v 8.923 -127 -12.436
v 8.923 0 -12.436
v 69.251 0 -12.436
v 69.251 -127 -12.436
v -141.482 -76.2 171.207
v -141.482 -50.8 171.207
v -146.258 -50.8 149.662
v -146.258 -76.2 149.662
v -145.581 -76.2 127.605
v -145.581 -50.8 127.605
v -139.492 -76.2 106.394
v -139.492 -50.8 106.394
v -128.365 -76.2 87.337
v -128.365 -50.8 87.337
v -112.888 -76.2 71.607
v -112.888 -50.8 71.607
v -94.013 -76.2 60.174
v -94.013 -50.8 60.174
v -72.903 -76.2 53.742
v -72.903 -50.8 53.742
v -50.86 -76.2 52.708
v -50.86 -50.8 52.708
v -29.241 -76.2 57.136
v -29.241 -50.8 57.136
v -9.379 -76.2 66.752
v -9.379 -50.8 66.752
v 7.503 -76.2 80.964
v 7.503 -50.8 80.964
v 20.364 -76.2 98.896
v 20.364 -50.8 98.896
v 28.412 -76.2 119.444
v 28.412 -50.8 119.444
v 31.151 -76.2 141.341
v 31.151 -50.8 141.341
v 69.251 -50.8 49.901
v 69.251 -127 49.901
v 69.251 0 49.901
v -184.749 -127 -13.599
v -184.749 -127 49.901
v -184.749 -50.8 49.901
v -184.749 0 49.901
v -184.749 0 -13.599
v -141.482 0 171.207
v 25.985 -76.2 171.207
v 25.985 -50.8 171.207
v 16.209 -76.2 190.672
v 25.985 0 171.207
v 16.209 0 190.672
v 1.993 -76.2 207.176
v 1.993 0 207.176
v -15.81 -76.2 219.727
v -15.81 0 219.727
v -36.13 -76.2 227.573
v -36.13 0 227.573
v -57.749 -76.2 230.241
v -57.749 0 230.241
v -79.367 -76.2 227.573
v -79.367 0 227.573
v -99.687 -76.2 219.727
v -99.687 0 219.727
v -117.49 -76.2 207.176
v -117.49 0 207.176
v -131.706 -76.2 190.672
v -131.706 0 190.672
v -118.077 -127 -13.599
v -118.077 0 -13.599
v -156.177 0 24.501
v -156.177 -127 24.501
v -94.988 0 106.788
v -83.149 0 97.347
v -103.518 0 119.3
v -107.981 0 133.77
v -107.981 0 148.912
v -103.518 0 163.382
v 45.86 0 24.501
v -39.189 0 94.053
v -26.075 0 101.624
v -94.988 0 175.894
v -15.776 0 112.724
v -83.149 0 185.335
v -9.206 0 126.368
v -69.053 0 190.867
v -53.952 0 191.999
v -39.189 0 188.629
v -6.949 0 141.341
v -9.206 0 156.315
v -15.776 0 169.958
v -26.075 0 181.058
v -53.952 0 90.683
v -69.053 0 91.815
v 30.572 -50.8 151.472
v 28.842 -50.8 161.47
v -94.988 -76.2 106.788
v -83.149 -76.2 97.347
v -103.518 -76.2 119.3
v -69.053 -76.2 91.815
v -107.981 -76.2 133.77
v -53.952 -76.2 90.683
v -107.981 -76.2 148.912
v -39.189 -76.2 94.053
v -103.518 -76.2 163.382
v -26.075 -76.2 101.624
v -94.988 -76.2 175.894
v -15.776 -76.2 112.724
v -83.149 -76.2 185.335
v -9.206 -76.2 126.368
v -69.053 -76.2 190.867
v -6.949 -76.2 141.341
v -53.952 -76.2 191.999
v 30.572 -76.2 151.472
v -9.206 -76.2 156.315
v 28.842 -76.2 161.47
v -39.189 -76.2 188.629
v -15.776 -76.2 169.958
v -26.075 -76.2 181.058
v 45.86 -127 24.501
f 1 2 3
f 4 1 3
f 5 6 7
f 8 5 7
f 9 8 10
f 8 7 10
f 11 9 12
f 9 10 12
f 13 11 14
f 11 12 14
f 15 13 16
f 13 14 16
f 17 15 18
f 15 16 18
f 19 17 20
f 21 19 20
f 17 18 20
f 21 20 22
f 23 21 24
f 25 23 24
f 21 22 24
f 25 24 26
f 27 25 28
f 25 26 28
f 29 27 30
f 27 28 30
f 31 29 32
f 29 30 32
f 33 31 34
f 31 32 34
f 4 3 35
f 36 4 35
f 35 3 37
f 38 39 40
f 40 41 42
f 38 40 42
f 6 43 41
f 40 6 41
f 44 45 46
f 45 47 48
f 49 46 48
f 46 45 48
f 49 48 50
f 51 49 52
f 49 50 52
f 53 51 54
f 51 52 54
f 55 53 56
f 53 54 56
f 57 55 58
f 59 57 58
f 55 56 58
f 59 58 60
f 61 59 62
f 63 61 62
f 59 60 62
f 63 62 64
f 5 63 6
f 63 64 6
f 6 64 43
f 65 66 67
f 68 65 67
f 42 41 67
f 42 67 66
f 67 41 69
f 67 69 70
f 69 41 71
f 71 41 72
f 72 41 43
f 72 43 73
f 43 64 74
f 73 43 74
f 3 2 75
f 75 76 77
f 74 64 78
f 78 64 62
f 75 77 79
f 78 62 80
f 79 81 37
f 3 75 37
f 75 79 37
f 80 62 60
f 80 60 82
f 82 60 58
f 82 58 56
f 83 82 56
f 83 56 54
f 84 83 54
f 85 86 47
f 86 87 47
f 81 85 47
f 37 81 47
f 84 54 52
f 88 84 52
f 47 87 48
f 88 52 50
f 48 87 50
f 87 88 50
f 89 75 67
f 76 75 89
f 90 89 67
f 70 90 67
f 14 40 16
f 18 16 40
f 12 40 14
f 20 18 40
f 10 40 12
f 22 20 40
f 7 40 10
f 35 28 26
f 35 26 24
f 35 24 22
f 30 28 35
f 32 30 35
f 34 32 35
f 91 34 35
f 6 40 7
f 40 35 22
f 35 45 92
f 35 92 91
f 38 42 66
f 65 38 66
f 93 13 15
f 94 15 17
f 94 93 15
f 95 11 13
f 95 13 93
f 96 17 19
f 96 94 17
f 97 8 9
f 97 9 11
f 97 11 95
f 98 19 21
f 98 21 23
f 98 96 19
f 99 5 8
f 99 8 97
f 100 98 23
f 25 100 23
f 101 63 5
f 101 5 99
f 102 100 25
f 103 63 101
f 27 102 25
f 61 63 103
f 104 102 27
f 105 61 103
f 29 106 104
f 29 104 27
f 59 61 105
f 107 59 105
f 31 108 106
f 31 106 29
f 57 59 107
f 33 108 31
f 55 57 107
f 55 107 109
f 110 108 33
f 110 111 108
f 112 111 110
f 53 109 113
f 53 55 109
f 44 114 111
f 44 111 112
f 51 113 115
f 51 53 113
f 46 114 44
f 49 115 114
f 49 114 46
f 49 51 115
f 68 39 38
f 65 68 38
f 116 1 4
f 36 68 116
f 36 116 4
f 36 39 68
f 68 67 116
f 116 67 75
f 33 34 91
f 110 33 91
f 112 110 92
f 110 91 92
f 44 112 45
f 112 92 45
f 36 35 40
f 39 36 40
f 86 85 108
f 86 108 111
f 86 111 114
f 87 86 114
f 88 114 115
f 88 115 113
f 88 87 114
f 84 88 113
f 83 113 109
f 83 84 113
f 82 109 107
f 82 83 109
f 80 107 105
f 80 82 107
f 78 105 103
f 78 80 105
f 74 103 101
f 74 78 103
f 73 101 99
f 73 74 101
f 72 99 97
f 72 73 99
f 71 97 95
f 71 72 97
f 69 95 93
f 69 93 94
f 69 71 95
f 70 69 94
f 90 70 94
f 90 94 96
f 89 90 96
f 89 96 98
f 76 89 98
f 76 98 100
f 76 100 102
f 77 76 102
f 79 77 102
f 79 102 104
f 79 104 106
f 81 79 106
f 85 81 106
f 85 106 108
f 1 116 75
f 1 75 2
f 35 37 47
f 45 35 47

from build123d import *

# Parameters (mm, degrees)
F1_DEPTH = 127
F0_R     = 50.8
F2_DEPTH = 50.8
F3_DEPTH = 76.2


with BuildPart() as f1:
    # F0 (on Front) → F1 (new body)
    with BuildSketch(Plane.XZ):
        Polygon((8.923398, -12.435868), (69.251364, -12.435868), (69.251364, 49.901095), (-184.748636, 49.901095), (-184.748636, -13.598905), (-118.076602, -13.598905), (-156.176602, 24.501095), (45.860362, 24.501095), align=None)
    extrude(amount=F1_DEPTH)

    # F0 (on Front) → F2 (join)
    with BuildSketch(Plane.XZ):
        with BuildLine():
            Line((-184.748636, 49.901095), (69.251364, 49.901095))
            Line((69.251364, 49.901095), (25.984603, 171.206705))
            ThreePointArc((25.984603, 171.206705), (29.850151, 156.495716), (31.151364, 141.341095))
            ThreePointArc((31.151364, 141.341095), (-72.903256, 53.742308), (-141.481875, 171.206705))
            Line((-141.481875, 171.206705), (-184.748636, 49.901095))
        make_face()
        with BuildLine():
            ThreePointArc((31.151364, 141.341095), (29.850151, 156.495716), (25.984603, 171.206705))
            ThreePointArc((25.984603, 171.206705), (-57.748636, 230.241095), (-141.481875, 171.206705))
            ThreePointArc((-141.481875, 171.206705), (-72.903256, 53.742308), (31.151364, 141.341095))
        make_face()
        with Locations((-57.748636, 141.341095)):
            Circle(F0_R, mode=Mode.SUBTRACT)
    extrude(amount=F2_DEPTH)

    # F0 (on Front) → F3 (join)
    with BuildSketch(Plane.XZ):
        with BuildLine():
            ThreePointArc((31.151364, 141.341095), (29.850151, 156.495716), (25.984603, 171.206705))
            ThreePointArc((25.984603, 171.206705), (-57.748636, 230.241095), (-141.481875, 171.206705))
            ThreePointArc((-141.481875, 171.206705), (-72.903256, 53.742308), (31.151364, 141.341095))
        make_face()
        with Locations((-57.748636, 141.341095)):
            Circle(F0_R, mode=Mode.SUBTRACT)
    extrude(amount=F3_DEPTH)


solid = f1.part
